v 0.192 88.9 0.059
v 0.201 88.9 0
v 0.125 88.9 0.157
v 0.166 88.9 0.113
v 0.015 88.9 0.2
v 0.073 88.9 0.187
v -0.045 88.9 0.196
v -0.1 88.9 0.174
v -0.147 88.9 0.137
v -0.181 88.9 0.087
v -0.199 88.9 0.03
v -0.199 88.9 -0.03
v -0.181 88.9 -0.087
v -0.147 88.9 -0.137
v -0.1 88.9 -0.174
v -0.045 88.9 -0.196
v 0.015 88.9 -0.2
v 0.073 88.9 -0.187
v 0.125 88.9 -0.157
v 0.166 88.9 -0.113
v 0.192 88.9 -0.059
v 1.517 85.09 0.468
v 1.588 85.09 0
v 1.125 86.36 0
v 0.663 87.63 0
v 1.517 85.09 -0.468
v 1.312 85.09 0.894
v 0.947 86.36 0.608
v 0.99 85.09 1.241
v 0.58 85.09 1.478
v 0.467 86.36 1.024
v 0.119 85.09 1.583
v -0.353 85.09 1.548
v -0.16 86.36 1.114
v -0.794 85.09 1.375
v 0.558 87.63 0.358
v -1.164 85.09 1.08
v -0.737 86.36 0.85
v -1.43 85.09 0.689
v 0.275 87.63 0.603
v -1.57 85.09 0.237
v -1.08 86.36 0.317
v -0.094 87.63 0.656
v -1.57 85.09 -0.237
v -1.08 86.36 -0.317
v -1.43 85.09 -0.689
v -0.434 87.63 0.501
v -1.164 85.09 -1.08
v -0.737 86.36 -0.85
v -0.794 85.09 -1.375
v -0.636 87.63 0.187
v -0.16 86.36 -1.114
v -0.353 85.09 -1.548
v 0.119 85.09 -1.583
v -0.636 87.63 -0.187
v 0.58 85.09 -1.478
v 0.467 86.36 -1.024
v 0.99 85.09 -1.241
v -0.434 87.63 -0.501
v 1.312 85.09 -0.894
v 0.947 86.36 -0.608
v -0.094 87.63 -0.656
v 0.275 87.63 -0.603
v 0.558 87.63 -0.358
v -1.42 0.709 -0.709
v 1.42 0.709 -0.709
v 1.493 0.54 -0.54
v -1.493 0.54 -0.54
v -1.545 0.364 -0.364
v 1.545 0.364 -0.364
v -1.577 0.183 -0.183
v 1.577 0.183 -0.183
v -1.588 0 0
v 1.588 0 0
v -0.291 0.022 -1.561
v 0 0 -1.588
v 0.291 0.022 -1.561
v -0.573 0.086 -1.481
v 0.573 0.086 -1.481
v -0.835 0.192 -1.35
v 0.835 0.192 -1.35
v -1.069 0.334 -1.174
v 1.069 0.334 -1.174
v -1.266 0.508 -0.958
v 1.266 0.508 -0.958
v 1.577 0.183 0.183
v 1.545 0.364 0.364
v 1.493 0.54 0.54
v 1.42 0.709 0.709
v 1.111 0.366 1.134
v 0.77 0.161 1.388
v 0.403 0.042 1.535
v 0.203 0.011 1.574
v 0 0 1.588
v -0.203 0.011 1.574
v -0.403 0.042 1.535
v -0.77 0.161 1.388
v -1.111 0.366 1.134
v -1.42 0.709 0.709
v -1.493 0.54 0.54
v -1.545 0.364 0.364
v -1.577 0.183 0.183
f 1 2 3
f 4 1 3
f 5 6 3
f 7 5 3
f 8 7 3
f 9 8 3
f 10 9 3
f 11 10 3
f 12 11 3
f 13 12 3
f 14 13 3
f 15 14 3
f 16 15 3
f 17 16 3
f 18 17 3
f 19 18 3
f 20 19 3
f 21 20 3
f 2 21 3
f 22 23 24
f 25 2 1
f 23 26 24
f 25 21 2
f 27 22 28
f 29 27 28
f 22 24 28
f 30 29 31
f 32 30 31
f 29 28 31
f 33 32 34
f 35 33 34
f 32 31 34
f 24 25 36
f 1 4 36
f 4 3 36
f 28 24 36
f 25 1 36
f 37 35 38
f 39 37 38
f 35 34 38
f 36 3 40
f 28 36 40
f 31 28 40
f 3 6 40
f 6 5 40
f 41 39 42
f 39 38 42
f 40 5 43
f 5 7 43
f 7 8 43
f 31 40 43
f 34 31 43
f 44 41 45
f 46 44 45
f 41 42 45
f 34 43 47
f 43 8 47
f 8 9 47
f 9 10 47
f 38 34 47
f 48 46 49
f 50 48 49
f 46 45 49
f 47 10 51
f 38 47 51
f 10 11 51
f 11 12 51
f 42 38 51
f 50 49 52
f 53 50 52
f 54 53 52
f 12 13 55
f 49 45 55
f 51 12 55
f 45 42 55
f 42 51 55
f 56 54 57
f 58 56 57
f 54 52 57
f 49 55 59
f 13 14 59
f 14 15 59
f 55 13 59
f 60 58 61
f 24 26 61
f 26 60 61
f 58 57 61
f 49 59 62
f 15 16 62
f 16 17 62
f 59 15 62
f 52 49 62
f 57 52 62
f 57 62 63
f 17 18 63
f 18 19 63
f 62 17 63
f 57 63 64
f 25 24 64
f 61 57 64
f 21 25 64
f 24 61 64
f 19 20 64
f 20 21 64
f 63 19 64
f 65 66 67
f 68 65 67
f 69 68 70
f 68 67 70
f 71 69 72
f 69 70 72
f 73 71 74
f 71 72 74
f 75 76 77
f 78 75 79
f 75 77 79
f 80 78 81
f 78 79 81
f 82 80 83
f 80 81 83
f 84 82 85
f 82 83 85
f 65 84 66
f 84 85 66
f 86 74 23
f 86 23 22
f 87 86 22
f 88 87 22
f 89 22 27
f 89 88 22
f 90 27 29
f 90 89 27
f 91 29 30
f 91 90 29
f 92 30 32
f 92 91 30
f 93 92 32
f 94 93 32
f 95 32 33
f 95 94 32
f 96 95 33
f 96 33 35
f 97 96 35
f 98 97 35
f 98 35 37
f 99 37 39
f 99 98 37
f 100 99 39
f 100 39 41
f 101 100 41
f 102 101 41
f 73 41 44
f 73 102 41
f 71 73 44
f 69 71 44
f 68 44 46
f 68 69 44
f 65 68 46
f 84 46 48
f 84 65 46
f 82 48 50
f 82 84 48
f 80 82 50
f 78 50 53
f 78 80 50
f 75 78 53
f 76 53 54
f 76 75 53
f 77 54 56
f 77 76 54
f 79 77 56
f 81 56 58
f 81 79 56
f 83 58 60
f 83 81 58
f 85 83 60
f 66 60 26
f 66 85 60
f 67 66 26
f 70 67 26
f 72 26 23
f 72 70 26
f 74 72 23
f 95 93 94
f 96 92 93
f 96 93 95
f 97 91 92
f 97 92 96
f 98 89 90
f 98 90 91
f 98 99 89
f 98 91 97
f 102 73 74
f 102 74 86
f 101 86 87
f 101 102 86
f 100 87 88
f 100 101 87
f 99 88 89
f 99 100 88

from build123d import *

# Parameters (mm, degrees)
F0_R     = 1.5875
F1_DEPTH = 88.9
F2_SIZE2 = 1.386727
F2_SIZE  = 3.81
F4_DEPTH = 25.4
F5_DEPTH = 25.4


with BuildPart() as f1:
    # F0 (on Front) → F1 (new body)
    with BuildSketch(Plane.XZ):
        Circle(F0_R)
    extrude(amount=-F1_DEPTH)

    # F2
    f2_edges = [f1.edges().sort_by_distance(p)[0] for p in [
        (-1.5875, 88.9, 0),
    ]]
    chamfer(f2_edges, length=F2_SIZE, length2=F2_SIZE2)

    # F3 (on Right) → F4 (cut)
    with BuildSketch(Plane.YZ):
        Polygon((0.709303, -0.709303), (0, 0), (0, -1.5875), align=None)
        Polygon((0.709303, 0.709303), (0, 1.5875), (0, 0), align=None)
    extrude(amount=-F4_DEPTH, mode=Mode.SUBTRACT)

    # F3 (on Right) → F5 (cut)
    with BuildSketch(Plane.YZ):
        Polygon((0.709303, -0.709303), (0, 0), (0, -1.5875), align=None)
        Polygon((0.709303, 0.709303), (0, 1.5875), (0, 0), align=None)
    extrude(amount=F5_DEPTH, mode=Mode.SUBTRACT)


solid = f1.part
